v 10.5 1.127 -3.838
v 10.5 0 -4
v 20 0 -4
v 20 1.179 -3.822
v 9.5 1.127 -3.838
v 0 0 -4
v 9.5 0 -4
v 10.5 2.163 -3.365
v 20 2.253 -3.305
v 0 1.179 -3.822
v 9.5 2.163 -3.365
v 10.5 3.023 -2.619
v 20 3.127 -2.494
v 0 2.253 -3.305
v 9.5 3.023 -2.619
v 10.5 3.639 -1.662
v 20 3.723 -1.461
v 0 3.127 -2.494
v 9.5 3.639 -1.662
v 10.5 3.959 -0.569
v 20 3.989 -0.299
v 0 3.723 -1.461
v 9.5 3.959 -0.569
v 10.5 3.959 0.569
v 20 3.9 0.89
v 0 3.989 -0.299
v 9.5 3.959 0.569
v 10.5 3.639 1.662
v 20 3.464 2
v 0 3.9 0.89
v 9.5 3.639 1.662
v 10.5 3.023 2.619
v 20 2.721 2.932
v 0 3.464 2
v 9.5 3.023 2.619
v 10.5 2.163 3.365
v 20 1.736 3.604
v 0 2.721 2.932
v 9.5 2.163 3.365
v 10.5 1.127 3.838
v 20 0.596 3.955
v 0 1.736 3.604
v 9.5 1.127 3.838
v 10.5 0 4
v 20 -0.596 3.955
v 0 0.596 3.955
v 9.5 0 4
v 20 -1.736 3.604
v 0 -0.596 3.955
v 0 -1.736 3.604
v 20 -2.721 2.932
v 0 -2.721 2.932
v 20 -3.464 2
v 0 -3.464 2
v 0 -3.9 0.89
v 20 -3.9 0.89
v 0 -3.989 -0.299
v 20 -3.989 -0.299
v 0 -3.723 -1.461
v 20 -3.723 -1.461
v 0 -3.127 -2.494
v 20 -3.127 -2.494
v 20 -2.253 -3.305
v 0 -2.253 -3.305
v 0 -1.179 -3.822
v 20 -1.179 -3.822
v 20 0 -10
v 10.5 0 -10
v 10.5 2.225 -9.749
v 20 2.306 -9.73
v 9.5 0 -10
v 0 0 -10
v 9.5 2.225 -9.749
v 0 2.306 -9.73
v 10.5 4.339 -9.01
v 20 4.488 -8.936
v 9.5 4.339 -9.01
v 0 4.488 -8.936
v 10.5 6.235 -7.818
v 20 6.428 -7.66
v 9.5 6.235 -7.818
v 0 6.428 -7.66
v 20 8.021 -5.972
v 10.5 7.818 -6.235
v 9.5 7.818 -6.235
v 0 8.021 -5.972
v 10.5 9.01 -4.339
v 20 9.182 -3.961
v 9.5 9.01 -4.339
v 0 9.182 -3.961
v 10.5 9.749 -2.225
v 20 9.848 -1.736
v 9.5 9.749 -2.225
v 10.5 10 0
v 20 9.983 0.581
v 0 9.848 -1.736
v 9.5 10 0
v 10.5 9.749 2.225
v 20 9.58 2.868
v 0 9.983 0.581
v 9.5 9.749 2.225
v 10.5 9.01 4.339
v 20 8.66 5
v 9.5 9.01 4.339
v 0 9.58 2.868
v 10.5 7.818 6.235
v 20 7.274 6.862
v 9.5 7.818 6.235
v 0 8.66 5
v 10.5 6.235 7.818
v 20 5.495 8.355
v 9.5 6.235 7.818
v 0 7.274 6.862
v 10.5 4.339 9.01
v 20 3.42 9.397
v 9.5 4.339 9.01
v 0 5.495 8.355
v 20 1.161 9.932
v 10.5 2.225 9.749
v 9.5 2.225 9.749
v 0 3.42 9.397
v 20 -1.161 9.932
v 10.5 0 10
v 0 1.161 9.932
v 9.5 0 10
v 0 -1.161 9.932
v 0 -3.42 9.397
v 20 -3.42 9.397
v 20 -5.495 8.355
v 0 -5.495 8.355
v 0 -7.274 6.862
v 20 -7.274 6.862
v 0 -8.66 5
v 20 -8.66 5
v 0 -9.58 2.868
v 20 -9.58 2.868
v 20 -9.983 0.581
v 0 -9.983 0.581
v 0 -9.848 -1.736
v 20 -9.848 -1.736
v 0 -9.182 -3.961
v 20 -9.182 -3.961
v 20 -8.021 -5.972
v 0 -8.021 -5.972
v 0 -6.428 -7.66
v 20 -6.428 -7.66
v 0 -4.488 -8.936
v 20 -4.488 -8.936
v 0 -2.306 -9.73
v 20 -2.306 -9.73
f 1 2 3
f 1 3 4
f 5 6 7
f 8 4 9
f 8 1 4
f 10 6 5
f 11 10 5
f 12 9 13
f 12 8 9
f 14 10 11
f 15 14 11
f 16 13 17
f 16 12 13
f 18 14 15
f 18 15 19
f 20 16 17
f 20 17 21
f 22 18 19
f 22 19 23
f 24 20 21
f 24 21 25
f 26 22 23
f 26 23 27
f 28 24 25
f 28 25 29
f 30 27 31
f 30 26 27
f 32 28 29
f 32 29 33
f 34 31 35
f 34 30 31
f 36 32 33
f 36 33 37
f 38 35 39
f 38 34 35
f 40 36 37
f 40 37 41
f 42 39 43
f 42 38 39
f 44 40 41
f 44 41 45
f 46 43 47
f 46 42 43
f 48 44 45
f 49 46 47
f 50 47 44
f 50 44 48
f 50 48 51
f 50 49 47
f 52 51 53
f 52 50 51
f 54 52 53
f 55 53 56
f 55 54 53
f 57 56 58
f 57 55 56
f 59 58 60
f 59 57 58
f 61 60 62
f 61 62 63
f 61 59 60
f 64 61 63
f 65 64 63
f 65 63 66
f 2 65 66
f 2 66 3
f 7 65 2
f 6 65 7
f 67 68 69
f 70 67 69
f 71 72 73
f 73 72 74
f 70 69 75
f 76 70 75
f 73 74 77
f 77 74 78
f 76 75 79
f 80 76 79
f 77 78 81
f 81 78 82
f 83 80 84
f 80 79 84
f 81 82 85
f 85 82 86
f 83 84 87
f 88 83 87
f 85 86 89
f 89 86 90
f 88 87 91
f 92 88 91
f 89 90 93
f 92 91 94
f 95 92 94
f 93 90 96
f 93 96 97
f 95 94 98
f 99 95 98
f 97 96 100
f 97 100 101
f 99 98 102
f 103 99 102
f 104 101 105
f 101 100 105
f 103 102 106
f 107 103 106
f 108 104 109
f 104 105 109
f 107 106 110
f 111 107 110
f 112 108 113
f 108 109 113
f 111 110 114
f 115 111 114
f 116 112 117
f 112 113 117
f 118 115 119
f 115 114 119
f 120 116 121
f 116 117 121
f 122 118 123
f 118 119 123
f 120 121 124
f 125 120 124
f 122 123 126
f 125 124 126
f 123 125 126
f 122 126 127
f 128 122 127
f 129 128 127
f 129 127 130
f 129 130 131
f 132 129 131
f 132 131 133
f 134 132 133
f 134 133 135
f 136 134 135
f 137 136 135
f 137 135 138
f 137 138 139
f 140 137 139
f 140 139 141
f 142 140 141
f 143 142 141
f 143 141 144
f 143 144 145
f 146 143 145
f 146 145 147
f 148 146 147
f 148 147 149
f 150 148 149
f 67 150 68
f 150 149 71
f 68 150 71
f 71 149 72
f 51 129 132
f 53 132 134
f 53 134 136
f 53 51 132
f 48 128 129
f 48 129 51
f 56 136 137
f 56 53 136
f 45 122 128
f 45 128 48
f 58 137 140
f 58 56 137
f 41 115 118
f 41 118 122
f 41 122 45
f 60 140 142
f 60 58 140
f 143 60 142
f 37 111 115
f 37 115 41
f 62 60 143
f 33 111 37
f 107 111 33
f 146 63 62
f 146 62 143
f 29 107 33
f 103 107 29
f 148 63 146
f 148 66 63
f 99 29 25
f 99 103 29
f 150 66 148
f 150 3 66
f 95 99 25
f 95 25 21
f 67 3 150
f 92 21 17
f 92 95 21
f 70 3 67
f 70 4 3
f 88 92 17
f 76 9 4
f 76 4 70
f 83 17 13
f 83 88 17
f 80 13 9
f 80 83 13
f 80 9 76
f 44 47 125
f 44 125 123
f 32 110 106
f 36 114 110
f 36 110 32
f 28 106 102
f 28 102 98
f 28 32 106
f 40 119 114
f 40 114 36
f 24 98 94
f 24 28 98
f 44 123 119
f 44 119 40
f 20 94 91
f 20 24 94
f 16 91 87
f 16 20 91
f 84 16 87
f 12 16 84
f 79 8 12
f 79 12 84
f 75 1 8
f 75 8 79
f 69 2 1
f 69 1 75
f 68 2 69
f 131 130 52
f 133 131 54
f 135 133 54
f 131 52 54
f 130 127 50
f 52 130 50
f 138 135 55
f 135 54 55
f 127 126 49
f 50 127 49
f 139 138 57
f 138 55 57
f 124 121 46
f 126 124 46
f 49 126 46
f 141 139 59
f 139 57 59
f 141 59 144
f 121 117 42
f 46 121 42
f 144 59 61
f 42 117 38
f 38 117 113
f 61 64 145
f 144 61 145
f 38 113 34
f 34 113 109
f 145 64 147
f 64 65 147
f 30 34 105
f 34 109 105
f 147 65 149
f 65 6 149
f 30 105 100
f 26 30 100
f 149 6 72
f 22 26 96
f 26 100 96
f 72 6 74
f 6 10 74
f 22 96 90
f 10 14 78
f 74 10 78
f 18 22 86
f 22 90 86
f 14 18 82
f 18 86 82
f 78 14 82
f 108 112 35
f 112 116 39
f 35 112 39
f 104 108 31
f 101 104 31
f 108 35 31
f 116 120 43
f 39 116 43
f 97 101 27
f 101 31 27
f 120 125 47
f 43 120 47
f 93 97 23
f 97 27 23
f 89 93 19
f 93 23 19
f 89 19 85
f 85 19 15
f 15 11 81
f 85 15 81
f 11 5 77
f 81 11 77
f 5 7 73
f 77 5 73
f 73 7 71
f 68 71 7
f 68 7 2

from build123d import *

# Parameters (mm, degrees)
SKETCH_1_R          = 10
SKETCH_1_R_2        = 4
EXTRUDE_1_DEPTH     = 20
SKETCH_2_W          = 1
SKETCH_2_H          = 20
CUT_EXTRUDE_1_DEPTH = 25.494897428


with BuildPart() as part:
    # ｽｹｯﾁ1 → ﾎﾞｽ - 押し出し1 (new body)
    with BuildSketch(Plane(origin=(0, 0, 0), x_dir=(0, 0, -1), z_dir=(1, 0, 0))):
        Circle(SKETCH_1_R)
        Circle(SKETCH_1_R_2, mode=Mode.SUBTRACT)
    extrude(amount=EXTRUDE_1_DEPTH)

    # ｽｹｯﾁ2 → ｶｯﾄ - 押し出し1 (cut, through all)
    with BuildSketch(Plane(origin=(0, 0, 0), x_dir=(1, 0, 0), z_dir=(0, 1, 0))):
        with Locations((10, 0)):
            Rectangle(SKETCH_2_W, SKETCH_2_H)
    extrude(amount=CUT_EXTRUDE_1_DEPTH, mode=Mode.SUBTRACT)


solid = part.part
